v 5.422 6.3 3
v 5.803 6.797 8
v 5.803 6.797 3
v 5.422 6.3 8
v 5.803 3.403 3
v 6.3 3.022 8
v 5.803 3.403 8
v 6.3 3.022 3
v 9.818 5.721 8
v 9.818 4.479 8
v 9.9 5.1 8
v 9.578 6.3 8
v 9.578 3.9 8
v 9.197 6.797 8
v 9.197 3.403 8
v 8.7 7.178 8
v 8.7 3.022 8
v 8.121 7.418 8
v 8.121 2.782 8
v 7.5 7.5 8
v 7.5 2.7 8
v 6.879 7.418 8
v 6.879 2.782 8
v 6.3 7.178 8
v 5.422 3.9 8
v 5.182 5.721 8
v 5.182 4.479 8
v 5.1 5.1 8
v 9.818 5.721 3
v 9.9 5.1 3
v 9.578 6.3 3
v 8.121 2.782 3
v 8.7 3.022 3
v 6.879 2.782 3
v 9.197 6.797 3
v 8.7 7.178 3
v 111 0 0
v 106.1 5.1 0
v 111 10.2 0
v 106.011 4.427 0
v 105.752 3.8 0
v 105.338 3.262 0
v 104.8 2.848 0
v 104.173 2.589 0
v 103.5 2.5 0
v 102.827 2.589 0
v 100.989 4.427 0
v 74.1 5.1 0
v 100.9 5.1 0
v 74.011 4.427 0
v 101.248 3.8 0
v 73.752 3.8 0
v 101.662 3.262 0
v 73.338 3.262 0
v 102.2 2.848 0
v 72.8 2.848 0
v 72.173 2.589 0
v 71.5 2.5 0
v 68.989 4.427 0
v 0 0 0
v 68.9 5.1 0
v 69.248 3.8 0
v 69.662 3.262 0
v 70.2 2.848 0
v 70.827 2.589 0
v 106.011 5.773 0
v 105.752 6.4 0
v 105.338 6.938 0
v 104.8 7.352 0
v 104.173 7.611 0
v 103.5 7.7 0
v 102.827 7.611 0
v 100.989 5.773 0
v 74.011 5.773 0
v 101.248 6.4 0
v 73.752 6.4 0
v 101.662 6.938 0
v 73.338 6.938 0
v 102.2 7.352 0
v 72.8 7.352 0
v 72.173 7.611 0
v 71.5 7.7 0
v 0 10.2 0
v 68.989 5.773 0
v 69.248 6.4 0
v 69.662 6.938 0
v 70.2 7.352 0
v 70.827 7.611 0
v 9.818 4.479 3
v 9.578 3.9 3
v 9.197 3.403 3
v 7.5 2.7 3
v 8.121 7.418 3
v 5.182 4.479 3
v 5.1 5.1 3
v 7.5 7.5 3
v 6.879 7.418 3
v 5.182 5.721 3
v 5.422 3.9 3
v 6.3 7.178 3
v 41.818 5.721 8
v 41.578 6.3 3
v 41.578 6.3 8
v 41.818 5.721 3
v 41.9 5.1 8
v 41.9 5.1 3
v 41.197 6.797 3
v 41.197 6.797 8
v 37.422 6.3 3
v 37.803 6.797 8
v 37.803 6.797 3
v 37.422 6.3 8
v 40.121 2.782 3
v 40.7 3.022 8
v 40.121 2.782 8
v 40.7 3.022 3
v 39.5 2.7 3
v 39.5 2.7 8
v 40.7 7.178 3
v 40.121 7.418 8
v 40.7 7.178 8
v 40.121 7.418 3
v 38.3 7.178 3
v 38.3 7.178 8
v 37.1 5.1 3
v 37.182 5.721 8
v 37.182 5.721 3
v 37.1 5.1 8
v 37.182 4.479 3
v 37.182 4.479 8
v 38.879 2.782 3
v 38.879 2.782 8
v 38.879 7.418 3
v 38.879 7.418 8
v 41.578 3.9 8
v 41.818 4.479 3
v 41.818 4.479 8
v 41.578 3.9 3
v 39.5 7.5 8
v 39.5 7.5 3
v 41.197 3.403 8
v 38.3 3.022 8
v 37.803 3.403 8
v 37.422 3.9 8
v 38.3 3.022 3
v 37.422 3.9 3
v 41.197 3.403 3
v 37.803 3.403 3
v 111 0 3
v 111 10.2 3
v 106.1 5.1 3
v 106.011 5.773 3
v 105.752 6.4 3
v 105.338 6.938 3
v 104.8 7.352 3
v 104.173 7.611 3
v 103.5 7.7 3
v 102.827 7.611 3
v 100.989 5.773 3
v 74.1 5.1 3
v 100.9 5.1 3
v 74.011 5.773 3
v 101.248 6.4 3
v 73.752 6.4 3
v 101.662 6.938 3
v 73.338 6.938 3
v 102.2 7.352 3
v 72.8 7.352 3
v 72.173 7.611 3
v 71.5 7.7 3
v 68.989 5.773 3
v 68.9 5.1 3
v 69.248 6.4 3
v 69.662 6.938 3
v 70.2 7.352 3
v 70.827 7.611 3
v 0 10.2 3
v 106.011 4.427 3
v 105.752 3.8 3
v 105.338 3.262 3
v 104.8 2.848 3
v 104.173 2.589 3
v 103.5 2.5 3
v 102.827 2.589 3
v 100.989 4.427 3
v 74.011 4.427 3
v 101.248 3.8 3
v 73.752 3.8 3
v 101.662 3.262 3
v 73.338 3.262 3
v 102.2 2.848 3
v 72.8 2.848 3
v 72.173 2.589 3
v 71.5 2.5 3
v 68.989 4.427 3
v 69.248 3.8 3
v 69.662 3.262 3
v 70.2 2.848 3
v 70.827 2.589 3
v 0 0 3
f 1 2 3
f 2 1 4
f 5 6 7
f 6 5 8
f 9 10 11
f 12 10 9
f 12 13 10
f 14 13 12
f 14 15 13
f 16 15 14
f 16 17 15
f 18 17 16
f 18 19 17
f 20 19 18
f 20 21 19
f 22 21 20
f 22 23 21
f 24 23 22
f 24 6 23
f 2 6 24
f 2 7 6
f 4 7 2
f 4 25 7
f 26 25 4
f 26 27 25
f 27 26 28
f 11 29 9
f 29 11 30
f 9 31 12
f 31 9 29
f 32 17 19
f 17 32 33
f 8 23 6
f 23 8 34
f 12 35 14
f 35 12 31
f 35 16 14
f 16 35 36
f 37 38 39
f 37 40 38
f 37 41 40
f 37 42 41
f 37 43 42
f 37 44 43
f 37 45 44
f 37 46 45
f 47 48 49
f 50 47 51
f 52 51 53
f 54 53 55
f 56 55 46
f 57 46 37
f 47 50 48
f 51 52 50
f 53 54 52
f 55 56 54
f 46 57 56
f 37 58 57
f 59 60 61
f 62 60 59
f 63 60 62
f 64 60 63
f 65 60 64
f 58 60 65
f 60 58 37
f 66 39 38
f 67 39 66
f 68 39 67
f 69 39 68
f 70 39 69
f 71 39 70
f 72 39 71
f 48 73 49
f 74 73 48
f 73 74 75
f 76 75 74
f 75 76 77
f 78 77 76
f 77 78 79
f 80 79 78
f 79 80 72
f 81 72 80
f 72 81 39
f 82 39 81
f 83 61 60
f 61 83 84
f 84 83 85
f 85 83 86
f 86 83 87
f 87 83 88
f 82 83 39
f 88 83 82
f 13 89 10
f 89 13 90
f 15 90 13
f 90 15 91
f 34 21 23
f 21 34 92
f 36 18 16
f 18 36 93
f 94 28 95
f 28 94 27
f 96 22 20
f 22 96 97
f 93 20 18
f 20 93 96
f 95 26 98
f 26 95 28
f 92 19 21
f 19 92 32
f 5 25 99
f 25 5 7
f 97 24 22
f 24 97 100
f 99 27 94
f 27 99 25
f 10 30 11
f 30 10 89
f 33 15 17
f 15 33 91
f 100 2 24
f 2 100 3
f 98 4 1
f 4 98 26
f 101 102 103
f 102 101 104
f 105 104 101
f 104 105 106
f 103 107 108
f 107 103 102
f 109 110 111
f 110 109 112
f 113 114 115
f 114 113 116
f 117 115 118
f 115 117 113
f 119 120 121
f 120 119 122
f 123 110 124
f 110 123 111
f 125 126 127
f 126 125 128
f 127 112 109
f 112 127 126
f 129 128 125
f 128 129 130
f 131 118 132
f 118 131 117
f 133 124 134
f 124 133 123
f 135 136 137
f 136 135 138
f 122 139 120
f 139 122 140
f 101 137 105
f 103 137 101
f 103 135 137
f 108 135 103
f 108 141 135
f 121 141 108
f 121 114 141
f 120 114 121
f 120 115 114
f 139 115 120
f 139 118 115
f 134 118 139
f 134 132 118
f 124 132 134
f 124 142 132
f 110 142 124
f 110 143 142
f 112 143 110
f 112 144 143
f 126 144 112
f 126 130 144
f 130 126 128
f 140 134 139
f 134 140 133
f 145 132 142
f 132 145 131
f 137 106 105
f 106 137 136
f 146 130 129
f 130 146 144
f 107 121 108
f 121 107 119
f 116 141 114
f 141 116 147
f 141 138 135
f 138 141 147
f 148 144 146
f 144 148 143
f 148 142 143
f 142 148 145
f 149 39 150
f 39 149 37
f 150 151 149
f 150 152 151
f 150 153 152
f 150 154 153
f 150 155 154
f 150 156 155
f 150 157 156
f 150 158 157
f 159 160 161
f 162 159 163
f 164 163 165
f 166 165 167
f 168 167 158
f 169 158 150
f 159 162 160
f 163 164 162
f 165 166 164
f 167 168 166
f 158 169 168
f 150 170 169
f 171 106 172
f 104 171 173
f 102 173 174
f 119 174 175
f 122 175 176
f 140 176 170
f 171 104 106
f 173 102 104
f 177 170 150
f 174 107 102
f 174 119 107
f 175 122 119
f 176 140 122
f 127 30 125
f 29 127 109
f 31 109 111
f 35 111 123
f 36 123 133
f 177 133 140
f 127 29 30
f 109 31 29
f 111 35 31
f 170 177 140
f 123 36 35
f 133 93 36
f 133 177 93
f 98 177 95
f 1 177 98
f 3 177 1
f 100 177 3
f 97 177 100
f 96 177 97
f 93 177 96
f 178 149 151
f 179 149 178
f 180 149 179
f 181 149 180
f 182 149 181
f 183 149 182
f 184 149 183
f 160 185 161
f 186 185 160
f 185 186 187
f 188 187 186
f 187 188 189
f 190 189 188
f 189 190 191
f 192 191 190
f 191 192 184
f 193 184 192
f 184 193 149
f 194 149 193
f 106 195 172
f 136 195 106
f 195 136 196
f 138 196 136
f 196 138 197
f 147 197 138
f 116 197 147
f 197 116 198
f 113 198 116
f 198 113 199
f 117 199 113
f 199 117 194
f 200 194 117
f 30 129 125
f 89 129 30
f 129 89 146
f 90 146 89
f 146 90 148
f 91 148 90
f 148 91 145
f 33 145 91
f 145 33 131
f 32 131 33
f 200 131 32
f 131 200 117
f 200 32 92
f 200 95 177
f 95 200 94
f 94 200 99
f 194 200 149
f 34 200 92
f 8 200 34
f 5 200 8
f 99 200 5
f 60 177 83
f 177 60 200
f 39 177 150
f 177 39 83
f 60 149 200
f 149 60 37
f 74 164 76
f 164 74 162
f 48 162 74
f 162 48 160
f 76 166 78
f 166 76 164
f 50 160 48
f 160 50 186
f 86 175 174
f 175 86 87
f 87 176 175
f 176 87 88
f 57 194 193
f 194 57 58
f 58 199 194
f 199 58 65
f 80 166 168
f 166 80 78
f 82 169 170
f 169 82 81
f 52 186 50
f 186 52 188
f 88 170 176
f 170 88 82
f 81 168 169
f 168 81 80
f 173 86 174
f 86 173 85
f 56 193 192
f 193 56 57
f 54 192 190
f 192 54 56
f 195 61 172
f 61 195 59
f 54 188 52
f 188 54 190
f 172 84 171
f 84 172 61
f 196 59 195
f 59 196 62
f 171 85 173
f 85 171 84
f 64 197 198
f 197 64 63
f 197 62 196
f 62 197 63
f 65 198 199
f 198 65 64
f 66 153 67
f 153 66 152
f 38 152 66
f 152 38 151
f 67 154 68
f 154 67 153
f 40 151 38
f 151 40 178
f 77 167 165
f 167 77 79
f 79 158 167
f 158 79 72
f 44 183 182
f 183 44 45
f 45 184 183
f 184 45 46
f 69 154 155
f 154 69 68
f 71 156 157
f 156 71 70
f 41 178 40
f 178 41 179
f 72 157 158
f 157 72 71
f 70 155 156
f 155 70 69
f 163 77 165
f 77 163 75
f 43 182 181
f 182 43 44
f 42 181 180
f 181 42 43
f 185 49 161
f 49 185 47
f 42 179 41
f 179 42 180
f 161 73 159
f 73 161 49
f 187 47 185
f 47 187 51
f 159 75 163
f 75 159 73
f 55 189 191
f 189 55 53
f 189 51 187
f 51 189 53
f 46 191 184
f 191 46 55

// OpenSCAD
//By Coat, 04-apr-2019
//Licensed under the Creative Commons - Attribution license.
//Mallet to extend the peg-holes for shelfs in cabinets etc.

//number of guidepins
nguidepin=2;
//distance between these pins (center to center)
guidedistance=32;//[1:0.1:200]
//number of peg-holes to set out
nsetouthole=2;
//distance between these holes (center to center)
setoutdistance=32;//[1:0.1:200]

//height of the guidepin (make it smaller then the depth of the holes)
heightpin=5;//[1:0.1:20]
//diameter of the guidepin (tolerance will be extracted)
diampin=5;//[1:0.1:20]
//diameter of the peg-hole (tolerance will be added)
diamhole=5;//[1:0.1:20]
//tolerance to make your work easier
tolerance = 0.2;
//thickness of the baseplate
thickplate=3;//[1:0.1:20]

//modules

module pin(ii)
{
  dx = space+diampin/2+ii*guidedistance;
  dy=widthplate/2; 
  diamp= diampin-tolerance;  
   
  translate([dx,dy,0])
    cylinder(d=diamp, h= heightpin+thickplate);   
}  

module hole(jj)
{
  dx = space+diampin/2
       + (nguidepin-1)*guidedistance
       + jj*setoutdistance
       + setoutdistance;
       
  dy=widthplate/2; 
  diamh= diamhole+tolerance;  
  translate([dx,dy,-thickplate/4])
    cylinder(d=diamh, h= thickplate*2);   
}  



//main
//secondary parameters
$fn= 24;
space=5;
lengthplate= 
  (nguidepin-1)*guidedistance
  + nsetouthole*setoutdistance
  + diampin/2
  + diamhole/2
  + space*2;  //space on both sides
  
widthplate = max(diampin-tolerance,diamhole+tolerance) + space;  
echo(widthplate);  

//the thing
difference()
{
  union()
  {
    cube([lengthplate, widthplate,thickplate]); //baseplate
    for(i =[0:nguidepin-1])                     //guidepins 
      pin(i); 
  }
  for(j =[0:nsetouthole-1])                    //setout holes 
    hole(j);
}

  
